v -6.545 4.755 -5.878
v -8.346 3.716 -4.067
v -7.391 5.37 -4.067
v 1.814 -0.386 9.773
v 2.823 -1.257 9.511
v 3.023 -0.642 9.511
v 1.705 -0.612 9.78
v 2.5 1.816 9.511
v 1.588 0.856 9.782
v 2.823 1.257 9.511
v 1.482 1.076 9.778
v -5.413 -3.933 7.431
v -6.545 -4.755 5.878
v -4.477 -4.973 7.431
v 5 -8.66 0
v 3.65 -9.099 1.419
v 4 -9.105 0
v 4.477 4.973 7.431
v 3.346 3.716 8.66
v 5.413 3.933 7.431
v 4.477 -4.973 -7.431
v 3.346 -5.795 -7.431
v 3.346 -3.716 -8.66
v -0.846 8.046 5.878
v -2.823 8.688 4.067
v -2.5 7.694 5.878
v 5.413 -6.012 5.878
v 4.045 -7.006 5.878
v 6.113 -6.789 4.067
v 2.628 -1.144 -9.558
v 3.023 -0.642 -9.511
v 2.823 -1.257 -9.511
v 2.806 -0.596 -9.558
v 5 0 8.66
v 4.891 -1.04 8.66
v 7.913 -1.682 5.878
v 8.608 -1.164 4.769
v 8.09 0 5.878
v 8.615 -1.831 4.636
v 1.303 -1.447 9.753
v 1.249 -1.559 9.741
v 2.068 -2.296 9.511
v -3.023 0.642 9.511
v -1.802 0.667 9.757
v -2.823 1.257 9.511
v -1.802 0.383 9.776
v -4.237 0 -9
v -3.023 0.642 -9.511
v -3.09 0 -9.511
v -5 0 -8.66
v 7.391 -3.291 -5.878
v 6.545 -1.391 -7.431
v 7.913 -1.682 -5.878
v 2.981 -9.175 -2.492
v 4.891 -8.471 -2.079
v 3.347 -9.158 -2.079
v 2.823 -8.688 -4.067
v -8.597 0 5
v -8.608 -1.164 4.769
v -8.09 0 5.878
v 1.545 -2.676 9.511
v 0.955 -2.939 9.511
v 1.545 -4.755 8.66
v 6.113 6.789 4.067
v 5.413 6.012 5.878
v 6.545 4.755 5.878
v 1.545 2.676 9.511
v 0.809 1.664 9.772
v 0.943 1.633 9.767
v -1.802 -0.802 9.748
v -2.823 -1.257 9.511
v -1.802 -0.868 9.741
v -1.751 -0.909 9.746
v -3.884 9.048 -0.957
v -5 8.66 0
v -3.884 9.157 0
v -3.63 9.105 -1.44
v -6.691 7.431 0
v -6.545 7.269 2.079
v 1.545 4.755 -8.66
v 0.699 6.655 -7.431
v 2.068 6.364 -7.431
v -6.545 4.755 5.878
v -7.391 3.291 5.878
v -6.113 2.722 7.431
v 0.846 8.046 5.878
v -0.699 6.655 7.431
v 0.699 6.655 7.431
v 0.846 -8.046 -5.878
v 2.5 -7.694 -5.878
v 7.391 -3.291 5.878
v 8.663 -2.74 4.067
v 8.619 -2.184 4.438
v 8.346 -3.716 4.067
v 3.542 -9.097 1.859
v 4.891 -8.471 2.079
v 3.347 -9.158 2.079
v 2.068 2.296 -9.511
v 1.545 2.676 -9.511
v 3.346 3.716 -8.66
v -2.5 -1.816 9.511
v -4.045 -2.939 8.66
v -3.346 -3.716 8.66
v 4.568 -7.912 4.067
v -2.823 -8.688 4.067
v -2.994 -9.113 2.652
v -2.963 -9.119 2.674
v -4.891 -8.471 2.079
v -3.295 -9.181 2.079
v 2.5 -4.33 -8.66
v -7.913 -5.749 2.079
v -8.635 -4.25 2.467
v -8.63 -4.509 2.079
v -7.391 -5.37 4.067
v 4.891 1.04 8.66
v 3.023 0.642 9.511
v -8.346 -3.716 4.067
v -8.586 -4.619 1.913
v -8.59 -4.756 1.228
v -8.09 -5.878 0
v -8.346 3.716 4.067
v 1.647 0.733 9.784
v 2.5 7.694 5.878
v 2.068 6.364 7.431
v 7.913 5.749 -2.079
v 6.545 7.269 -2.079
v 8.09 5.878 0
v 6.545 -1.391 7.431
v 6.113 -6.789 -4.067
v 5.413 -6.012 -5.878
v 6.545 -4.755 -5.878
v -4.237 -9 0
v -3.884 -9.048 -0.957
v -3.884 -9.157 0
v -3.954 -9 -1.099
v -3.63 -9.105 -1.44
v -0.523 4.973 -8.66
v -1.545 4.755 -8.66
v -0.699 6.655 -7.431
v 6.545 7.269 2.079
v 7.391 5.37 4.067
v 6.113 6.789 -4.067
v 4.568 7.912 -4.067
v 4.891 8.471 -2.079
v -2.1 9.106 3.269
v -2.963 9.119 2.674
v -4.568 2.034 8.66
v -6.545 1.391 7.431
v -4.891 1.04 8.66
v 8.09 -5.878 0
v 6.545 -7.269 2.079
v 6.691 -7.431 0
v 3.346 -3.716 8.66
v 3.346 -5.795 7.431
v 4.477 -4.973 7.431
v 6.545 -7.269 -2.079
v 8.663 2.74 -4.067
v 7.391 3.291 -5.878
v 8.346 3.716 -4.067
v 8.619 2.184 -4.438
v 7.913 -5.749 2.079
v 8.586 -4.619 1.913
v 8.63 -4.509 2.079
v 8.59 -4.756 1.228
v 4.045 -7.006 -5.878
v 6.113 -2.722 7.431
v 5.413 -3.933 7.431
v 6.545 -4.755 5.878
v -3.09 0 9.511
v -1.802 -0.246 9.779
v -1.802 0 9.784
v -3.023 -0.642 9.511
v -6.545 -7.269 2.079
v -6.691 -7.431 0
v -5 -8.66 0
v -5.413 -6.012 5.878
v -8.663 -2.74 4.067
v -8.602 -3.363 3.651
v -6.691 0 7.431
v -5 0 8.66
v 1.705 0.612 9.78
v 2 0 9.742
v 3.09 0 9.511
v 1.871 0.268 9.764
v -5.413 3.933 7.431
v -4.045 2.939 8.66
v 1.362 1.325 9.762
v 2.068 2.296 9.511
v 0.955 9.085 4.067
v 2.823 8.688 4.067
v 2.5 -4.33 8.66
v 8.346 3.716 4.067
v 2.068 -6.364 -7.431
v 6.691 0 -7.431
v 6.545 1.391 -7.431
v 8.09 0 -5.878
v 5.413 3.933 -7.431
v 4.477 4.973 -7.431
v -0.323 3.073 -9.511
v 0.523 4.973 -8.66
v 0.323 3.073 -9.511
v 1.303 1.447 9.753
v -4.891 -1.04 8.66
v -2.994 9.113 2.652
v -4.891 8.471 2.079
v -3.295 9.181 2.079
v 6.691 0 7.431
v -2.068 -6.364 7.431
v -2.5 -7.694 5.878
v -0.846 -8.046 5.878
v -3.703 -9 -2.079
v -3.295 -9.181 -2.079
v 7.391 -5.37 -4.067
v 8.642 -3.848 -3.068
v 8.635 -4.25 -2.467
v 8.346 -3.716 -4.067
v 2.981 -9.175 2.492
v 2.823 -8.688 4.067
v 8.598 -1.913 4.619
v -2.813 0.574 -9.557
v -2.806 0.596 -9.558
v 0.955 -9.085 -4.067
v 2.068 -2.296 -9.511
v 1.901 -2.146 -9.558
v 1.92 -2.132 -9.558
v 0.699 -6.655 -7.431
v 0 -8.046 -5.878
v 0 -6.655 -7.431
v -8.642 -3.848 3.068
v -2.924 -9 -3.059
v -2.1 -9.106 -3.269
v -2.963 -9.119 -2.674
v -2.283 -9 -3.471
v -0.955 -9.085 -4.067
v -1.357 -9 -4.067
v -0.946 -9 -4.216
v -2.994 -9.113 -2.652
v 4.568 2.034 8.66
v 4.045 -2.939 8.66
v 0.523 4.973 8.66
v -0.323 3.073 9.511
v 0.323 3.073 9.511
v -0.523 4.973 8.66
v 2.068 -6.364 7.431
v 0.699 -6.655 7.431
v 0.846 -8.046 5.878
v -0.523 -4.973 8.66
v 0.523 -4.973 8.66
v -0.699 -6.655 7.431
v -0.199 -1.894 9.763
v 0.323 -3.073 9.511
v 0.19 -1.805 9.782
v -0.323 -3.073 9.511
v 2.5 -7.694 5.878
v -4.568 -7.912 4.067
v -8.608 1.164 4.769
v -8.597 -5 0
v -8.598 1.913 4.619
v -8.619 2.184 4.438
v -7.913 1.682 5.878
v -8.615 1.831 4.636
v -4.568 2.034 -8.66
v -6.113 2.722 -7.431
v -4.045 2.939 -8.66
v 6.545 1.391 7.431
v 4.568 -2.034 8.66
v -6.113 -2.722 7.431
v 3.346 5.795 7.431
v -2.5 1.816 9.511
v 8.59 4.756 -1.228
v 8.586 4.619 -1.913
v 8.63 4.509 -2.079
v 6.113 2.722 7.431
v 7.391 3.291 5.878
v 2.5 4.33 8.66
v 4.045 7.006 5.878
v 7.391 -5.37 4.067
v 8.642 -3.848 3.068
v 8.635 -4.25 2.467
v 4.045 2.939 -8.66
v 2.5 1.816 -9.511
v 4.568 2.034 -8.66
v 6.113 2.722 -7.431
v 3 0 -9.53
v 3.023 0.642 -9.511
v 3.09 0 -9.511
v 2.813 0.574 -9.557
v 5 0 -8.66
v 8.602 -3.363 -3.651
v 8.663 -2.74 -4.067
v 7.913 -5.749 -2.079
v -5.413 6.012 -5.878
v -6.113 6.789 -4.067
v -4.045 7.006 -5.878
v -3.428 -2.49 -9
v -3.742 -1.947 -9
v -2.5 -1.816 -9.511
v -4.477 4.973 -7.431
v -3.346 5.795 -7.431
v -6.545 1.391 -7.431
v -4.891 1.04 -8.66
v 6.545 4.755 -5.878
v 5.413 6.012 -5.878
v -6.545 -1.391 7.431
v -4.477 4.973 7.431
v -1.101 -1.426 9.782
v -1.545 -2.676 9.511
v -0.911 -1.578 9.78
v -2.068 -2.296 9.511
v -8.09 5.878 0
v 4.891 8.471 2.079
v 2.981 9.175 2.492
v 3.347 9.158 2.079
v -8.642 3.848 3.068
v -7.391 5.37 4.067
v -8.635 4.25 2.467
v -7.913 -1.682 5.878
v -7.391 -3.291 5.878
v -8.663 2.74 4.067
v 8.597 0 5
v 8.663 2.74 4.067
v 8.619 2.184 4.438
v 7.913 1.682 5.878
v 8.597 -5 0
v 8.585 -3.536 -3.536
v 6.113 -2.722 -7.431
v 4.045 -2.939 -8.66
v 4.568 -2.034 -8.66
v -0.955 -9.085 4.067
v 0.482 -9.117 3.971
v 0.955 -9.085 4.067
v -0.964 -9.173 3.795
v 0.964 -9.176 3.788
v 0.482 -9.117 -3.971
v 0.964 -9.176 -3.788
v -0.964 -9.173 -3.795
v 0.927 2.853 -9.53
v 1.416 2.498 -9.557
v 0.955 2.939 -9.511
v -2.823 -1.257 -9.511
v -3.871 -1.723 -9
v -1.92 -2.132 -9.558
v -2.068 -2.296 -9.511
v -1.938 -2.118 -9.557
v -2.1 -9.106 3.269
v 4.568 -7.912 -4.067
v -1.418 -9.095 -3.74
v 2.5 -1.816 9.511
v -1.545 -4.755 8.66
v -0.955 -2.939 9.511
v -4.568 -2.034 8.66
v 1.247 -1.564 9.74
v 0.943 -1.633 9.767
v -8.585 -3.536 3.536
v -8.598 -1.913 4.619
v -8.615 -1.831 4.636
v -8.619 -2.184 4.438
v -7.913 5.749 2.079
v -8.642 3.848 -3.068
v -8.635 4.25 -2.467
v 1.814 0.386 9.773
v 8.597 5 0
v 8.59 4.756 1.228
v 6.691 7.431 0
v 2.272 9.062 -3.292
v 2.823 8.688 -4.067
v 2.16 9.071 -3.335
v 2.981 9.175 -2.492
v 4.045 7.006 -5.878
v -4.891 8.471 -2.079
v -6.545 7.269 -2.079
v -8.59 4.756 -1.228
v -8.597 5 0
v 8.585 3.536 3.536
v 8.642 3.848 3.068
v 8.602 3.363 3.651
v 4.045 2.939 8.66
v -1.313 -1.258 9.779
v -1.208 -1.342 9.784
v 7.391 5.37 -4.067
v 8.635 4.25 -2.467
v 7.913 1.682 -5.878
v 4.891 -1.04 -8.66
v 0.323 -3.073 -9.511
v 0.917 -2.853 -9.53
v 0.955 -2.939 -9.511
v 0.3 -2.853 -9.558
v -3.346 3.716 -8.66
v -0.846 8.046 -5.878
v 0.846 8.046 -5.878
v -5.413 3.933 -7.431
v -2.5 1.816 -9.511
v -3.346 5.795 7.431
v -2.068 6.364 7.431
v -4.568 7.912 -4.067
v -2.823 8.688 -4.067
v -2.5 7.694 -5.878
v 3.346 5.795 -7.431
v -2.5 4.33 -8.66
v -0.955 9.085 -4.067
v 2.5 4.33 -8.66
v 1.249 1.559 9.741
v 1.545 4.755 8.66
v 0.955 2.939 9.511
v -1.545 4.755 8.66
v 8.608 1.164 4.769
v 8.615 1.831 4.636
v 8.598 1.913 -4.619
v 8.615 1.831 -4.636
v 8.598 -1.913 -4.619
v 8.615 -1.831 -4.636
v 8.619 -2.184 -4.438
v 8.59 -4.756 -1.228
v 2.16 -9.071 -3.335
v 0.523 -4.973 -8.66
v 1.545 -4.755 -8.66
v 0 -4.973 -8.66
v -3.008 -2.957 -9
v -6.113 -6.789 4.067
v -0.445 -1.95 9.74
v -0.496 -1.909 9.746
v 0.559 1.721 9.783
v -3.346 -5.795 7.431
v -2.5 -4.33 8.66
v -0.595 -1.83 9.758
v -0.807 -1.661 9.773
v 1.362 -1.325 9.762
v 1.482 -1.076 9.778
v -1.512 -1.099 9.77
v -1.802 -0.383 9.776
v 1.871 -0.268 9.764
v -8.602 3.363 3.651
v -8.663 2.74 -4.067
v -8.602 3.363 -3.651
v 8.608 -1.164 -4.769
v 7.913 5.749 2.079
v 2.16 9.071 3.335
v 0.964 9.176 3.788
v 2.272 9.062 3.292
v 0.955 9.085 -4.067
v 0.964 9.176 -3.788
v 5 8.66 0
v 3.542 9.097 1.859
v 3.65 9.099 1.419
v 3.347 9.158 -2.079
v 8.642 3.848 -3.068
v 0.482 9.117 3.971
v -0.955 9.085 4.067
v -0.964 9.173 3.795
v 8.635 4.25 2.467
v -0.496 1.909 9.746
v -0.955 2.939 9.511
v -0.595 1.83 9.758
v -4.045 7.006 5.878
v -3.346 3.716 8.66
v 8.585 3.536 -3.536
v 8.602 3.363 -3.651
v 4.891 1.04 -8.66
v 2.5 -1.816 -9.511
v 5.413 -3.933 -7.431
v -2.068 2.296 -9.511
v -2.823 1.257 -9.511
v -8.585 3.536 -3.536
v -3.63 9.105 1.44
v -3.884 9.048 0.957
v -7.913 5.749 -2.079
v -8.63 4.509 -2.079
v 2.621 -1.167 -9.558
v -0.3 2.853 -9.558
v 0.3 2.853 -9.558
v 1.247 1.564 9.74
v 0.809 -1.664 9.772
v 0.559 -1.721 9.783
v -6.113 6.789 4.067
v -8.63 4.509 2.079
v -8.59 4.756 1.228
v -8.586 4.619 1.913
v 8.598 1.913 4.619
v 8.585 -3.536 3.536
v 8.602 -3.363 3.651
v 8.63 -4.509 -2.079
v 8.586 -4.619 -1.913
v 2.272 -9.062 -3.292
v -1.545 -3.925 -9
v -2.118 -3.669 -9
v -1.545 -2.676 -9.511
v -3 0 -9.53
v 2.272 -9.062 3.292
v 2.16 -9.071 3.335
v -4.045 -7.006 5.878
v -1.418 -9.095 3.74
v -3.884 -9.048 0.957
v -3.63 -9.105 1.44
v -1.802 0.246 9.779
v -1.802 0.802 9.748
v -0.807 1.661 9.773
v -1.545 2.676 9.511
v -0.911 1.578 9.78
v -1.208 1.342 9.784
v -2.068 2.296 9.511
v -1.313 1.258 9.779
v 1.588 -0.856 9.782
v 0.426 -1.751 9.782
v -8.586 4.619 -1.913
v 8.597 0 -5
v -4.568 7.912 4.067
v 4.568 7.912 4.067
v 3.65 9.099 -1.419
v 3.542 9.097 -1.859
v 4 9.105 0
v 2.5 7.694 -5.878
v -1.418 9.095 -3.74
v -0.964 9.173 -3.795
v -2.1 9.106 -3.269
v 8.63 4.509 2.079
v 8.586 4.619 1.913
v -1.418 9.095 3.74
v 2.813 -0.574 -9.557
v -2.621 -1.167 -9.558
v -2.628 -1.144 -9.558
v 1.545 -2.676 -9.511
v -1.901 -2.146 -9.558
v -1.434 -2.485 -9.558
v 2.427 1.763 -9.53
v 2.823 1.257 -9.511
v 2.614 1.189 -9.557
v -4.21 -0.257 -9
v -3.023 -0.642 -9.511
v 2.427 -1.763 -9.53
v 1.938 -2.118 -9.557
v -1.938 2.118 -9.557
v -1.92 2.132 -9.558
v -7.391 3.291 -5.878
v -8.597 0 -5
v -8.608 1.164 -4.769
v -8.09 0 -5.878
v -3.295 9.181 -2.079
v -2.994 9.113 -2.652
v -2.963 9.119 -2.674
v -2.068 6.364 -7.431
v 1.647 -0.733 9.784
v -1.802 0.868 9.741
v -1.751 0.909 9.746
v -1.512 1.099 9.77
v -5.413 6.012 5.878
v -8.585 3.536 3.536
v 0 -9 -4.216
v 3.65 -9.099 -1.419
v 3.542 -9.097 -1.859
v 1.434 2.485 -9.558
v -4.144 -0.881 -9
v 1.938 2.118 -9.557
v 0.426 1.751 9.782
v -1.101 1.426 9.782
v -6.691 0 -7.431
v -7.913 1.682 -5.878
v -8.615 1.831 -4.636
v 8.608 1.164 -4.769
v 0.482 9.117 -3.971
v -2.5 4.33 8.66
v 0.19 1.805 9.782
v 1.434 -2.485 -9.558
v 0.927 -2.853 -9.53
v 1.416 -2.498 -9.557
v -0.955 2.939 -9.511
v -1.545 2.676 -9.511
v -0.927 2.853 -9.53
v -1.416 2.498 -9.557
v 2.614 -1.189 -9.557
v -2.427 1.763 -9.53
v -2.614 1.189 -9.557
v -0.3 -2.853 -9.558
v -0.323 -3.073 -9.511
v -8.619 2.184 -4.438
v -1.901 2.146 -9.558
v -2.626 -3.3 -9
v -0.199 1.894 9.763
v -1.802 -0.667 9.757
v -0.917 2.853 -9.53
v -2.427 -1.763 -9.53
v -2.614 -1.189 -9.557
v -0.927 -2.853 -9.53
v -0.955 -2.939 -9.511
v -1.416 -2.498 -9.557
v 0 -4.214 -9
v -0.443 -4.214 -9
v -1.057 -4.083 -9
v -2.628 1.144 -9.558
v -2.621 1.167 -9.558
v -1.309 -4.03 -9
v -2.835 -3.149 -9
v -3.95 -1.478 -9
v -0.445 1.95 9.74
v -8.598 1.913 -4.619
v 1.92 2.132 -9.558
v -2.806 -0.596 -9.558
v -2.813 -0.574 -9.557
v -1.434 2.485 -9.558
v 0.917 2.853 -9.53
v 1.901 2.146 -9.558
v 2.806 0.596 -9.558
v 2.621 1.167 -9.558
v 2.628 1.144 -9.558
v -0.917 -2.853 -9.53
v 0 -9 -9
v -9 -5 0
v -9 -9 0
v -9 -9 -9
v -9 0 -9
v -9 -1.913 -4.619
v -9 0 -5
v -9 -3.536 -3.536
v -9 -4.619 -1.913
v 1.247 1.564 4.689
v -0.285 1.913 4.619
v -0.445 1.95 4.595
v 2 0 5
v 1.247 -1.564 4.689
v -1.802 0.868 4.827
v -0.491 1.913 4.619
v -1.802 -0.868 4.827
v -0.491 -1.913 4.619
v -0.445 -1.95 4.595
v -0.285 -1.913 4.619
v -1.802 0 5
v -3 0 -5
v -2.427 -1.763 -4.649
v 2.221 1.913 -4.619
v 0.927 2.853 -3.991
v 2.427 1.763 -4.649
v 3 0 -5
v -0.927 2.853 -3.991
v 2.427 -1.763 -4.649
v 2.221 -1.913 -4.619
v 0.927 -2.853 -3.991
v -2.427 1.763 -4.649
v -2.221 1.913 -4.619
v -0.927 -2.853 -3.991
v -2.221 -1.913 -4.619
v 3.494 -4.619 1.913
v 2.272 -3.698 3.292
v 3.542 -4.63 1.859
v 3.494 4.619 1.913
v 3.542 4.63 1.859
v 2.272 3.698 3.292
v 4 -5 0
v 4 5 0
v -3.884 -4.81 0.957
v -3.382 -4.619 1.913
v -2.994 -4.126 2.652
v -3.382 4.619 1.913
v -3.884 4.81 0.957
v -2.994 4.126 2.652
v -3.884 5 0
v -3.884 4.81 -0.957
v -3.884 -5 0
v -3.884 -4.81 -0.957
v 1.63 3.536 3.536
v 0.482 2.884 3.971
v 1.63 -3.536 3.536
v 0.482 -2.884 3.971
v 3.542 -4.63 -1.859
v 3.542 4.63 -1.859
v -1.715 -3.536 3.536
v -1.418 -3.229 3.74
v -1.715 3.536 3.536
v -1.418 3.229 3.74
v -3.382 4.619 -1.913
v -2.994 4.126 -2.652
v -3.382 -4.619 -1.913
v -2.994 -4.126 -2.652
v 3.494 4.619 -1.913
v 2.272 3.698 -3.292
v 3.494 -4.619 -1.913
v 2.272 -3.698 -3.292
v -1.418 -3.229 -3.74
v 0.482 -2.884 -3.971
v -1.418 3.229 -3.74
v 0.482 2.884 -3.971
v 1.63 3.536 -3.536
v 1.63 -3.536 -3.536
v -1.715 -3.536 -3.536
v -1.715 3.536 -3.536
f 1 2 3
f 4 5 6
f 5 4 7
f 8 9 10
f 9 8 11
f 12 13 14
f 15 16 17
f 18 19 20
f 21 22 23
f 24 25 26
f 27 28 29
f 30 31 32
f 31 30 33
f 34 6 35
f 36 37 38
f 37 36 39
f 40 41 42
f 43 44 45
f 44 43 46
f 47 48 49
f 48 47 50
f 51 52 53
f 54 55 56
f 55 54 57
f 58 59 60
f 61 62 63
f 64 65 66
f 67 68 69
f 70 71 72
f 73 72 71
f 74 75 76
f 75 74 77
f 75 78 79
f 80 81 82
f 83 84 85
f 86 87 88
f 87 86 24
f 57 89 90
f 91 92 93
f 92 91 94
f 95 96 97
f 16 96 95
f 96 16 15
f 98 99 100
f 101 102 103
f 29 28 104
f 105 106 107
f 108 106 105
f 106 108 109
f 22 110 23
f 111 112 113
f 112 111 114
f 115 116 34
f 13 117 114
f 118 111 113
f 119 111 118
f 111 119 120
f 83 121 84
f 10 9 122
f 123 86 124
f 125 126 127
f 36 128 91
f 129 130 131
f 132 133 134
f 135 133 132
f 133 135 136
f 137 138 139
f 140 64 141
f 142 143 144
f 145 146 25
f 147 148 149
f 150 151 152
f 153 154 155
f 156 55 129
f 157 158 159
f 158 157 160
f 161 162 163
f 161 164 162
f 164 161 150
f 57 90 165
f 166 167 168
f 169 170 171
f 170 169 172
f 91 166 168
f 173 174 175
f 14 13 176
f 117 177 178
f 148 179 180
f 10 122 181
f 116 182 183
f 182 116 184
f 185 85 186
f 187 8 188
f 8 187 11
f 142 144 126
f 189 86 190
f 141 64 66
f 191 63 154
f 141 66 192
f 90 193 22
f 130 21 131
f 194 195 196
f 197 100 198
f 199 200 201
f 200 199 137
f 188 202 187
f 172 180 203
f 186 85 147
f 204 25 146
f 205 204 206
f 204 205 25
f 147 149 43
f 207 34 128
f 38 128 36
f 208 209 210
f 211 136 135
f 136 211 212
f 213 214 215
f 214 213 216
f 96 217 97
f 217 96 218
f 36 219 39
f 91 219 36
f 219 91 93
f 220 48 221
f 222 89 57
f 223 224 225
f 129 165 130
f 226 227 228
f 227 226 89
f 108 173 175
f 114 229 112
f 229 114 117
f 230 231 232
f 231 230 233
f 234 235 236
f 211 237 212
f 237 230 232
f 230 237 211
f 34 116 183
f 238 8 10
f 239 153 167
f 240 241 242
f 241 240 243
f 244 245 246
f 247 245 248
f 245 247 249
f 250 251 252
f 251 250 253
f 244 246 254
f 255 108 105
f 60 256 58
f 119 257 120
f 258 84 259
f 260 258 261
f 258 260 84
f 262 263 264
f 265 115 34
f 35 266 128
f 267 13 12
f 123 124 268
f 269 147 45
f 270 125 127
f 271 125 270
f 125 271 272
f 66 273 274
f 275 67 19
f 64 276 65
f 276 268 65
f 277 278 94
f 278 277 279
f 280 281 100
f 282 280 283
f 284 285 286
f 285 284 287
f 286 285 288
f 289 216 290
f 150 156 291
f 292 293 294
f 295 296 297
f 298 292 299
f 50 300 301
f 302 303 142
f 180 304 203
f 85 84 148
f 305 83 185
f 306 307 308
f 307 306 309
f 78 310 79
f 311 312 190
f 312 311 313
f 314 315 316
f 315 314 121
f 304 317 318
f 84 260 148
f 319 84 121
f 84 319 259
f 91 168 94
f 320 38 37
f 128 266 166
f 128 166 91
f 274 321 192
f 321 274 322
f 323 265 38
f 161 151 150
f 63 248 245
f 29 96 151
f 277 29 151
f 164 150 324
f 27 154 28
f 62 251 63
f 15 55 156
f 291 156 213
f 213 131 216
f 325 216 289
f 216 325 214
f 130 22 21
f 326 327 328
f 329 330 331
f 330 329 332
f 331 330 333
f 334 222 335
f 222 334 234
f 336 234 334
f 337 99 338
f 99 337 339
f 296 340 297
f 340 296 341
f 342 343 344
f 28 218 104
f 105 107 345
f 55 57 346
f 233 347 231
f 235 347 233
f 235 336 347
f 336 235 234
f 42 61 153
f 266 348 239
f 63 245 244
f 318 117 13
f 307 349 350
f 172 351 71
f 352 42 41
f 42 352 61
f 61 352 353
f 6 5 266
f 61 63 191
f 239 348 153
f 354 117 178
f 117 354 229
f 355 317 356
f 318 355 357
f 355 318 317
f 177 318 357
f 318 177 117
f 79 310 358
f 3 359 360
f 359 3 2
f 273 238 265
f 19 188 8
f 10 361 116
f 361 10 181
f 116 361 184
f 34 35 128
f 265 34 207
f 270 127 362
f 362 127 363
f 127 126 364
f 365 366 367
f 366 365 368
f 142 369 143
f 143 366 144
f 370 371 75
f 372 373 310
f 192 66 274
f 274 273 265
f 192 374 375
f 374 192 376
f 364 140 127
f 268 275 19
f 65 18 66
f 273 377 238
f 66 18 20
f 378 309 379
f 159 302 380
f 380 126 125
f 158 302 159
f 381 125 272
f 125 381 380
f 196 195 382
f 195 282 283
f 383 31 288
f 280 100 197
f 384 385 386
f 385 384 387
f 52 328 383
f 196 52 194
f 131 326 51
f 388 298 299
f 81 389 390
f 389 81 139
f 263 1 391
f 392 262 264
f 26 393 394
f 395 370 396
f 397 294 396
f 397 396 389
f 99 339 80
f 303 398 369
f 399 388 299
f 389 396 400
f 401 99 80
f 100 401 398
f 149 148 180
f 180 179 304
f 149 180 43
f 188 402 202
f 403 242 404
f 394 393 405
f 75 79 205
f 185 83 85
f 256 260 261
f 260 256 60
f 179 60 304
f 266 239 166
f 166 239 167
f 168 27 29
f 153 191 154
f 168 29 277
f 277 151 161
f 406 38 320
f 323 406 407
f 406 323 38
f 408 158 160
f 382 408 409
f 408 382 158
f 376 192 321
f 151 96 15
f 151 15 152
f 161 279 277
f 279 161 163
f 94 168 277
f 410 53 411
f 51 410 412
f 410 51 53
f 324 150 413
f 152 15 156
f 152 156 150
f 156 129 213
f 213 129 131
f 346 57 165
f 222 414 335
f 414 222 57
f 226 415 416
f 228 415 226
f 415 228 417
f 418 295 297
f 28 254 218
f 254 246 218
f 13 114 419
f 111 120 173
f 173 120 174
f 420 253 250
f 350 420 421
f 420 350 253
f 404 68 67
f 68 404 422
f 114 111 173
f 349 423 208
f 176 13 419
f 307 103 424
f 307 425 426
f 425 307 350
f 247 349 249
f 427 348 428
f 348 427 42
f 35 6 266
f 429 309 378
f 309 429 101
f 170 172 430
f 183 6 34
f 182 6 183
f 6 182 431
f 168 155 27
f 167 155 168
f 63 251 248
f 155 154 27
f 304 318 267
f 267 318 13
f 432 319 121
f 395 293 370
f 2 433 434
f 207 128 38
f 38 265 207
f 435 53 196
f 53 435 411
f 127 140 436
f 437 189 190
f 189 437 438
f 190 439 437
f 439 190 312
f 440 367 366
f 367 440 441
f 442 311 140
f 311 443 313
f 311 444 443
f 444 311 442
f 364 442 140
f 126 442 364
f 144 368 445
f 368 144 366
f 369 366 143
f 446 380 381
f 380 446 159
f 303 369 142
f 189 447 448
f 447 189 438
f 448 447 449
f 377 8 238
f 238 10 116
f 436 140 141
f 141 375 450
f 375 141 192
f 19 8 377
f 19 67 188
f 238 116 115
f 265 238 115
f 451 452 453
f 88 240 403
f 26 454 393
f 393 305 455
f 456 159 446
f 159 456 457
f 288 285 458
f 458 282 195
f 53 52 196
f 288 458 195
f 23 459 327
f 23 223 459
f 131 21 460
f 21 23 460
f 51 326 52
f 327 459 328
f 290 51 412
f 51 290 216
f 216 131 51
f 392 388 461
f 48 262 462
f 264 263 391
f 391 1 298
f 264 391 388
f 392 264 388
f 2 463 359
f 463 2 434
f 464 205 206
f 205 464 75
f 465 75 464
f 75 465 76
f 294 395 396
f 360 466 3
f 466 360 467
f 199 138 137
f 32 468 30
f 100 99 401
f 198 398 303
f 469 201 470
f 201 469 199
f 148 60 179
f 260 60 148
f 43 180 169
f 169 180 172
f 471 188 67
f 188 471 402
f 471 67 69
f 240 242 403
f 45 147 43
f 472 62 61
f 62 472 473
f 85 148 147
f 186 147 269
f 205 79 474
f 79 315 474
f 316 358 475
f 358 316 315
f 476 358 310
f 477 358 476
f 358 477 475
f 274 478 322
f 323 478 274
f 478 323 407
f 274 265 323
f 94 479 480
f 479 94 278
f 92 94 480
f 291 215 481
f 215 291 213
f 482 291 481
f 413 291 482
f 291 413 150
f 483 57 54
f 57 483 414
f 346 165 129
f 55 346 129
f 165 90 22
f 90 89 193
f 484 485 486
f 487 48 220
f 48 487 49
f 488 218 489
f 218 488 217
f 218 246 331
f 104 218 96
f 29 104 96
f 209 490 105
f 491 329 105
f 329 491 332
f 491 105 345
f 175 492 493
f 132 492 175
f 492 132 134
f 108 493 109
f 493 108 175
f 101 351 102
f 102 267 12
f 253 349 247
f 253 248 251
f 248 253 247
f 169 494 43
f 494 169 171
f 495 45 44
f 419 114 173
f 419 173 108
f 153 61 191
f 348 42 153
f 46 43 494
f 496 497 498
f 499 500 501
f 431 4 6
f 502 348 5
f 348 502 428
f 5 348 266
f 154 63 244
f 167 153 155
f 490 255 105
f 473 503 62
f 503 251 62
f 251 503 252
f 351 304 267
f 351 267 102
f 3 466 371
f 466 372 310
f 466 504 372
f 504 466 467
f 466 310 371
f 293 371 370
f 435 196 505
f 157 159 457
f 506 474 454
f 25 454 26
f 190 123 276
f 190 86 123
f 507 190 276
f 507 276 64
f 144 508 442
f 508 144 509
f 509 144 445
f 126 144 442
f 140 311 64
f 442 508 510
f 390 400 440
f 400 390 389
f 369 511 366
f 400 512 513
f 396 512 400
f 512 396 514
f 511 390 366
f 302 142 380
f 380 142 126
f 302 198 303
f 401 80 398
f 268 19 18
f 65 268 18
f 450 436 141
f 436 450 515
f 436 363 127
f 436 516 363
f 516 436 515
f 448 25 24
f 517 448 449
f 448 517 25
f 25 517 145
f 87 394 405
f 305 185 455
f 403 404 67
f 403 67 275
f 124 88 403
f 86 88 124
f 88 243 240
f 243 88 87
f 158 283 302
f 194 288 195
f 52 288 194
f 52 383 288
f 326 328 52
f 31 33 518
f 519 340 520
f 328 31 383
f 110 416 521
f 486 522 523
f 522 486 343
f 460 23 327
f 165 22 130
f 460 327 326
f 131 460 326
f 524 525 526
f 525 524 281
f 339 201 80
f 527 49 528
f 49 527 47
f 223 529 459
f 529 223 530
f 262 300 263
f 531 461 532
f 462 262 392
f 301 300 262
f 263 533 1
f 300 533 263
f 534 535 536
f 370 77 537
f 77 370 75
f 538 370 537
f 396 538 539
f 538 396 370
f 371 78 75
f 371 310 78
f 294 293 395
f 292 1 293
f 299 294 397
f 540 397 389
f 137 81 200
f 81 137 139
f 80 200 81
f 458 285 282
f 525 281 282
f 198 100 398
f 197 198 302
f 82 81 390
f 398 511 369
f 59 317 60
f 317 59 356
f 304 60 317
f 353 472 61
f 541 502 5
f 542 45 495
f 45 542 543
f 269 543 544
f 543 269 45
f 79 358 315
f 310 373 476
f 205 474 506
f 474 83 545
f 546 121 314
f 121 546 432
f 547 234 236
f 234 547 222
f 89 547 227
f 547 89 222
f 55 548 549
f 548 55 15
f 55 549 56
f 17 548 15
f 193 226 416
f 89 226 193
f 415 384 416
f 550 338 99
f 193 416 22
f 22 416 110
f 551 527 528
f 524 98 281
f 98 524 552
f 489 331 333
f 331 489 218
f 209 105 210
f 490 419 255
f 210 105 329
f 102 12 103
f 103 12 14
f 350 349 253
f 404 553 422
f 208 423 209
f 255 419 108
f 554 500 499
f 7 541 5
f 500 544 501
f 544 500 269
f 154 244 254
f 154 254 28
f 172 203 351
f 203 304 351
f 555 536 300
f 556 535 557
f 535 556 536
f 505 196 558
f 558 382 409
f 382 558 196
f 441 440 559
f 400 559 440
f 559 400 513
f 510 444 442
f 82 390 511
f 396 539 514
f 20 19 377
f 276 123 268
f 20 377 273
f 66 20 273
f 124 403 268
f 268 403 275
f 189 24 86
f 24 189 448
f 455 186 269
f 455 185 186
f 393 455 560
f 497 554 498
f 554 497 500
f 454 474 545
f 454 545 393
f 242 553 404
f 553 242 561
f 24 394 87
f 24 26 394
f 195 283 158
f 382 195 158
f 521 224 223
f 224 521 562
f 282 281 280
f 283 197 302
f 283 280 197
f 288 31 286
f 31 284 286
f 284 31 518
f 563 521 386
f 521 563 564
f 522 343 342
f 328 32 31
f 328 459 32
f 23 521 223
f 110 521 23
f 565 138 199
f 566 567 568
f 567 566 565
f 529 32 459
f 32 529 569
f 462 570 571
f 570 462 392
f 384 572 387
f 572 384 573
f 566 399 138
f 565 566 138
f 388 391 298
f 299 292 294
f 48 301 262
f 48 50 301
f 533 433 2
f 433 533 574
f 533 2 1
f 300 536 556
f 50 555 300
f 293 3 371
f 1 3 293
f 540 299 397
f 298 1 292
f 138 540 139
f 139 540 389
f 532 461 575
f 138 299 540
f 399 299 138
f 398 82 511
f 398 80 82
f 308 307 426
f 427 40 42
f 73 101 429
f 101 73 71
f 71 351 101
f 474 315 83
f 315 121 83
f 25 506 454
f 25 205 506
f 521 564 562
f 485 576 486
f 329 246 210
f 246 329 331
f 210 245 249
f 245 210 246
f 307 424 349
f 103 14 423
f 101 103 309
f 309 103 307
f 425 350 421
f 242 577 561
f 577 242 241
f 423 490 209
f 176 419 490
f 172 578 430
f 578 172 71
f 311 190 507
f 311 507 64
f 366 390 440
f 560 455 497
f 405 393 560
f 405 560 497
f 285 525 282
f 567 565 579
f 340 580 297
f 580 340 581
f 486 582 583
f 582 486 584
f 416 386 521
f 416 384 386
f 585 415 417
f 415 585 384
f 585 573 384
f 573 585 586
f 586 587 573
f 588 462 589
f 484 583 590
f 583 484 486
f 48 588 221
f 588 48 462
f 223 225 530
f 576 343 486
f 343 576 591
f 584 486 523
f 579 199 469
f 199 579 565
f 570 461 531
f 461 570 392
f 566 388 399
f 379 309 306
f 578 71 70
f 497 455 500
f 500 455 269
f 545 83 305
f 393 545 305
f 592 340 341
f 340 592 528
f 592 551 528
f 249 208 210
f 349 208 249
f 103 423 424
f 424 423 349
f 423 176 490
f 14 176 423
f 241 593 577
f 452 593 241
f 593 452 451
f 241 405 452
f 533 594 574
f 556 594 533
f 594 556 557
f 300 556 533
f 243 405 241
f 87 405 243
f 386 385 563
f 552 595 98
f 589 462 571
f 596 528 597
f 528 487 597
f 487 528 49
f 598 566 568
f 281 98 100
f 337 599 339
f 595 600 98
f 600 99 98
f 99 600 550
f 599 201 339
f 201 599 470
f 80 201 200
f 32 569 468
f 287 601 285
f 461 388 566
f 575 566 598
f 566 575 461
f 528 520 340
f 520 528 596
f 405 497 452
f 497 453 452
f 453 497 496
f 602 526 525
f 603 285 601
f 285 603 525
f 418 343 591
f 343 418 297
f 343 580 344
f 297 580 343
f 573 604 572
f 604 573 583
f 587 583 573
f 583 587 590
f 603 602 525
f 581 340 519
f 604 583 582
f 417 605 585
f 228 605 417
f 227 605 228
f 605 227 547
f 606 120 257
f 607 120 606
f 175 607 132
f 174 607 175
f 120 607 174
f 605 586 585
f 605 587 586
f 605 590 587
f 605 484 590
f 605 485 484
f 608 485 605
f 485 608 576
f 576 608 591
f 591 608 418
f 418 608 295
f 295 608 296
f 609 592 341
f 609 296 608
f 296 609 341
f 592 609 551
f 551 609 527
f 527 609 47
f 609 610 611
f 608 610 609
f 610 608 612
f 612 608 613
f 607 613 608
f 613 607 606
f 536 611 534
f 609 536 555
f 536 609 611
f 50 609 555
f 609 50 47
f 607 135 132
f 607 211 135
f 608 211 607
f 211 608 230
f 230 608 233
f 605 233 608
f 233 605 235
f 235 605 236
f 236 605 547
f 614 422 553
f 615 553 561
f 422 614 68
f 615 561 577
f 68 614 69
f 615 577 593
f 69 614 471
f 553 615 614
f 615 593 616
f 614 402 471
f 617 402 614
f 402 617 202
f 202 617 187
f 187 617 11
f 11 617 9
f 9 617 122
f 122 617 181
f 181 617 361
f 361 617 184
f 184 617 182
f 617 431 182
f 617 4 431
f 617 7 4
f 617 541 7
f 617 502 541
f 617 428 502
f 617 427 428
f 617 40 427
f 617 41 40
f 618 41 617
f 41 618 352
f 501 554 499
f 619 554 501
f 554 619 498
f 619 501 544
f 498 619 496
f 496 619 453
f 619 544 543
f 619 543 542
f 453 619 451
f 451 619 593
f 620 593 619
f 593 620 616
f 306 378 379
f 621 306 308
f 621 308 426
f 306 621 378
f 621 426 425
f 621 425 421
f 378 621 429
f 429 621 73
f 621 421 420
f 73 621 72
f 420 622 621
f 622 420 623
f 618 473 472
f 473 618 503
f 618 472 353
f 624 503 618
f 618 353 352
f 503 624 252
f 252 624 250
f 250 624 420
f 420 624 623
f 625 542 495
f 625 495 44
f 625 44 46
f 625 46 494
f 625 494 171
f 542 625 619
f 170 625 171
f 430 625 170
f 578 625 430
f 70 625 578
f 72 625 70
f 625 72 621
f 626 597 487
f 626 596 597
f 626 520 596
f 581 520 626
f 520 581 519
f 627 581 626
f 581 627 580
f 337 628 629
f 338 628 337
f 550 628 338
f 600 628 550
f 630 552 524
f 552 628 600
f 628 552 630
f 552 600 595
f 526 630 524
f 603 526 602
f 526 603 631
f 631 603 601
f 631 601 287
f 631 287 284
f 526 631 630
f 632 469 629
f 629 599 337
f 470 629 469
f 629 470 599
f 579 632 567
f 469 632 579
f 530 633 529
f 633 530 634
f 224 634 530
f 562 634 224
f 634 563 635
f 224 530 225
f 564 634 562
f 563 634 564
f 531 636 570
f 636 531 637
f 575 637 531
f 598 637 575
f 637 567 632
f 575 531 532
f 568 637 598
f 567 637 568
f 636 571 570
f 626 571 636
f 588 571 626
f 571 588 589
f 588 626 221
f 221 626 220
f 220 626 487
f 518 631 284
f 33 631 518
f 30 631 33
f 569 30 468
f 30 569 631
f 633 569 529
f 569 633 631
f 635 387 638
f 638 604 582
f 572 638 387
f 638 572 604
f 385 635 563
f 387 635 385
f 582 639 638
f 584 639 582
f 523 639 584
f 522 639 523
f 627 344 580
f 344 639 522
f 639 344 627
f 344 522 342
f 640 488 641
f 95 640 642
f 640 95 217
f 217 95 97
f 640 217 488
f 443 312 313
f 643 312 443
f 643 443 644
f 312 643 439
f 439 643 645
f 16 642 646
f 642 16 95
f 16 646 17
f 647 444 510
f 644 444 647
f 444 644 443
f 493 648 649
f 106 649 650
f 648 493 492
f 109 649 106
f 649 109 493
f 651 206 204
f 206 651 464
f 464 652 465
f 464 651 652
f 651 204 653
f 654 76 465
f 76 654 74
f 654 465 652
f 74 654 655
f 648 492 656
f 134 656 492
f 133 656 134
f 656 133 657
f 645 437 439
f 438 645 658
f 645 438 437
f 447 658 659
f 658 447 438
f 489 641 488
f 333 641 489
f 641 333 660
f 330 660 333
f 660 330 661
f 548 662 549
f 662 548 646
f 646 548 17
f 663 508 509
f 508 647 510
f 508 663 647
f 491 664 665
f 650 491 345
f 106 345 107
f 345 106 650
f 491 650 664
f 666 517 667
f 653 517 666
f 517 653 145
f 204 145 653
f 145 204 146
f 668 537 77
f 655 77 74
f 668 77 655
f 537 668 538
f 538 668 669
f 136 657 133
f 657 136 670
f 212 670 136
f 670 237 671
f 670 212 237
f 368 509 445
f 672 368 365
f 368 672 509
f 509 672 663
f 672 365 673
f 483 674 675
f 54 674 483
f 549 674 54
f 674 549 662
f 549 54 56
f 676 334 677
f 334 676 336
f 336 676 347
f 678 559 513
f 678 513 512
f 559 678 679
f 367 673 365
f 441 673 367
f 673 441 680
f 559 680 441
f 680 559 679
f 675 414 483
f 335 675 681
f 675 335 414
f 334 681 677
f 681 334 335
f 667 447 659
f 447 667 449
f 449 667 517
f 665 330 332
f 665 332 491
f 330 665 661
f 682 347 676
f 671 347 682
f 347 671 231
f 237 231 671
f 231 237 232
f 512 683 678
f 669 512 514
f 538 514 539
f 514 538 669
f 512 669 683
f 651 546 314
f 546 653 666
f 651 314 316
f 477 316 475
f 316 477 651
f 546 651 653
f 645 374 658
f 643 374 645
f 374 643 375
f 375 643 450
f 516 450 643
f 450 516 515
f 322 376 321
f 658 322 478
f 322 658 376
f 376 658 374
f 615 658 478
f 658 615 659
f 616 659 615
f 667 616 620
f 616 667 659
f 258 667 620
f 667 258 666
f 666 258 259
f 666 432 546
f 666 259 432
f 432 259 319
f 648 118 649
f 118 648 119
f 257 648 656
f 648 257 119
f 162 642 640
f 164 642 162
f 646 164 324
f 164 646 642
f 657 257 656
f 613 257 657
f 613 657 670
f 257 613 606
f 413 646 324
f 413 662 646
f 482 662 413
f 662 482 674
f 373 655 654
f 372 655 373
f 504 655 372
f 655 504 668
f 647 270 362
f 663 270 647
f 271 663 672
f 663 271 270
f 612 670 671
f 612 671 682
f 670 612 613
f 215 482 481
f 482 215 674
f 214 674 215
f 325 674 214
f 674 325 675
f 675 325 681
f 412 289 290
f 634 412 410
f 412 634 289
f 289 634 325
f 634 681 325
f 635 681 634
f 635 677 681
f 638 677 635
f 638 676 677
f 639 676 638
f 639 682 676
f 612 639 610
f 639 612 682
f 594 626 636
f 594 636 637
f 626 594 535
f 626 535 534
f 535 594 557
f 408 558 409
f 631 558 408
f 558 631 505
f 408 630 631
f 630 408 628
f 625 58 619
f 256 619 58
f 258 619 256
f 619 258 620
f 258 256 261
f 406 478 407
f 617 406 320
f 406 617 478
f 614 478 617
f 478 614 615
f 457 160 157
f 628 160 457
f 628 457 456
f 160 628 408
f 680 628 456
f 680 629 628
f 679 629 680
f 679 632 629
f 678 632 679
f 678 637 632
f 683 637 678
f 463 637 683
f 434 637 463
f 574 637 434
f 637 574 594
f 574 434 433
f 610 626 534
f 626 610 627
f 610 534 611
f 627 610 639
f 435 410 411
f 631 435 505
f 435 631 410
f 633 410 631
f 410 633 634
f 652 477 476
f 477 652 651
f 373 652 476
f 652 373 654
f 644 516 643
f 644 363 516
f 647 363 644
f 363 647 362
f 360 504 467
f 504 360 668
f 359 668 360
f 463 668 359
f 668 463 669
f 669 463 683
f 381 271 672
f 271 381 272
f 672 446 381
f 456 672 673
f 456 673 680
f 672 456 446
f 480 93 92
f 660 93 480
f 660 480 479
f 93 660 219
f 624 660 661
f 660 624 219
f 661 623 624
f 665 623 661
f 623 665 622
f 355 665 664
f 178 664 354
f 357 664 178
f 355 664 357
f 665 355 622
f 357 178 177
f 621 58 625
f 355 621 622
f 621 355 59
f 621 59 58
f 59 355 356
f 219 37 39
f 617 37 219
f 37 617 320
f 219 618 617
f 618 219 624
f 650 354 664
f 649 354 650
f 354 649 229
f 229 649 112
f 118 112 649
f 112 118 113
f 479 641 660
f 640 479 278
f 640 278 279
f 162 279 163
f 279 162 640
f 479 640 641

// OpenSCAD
// $fn = 32;

difference()
{
    union() {
        sphere(r=10);
        
        translate([ -9, -9, -9 ])
        cube(9);
    }
    
    translate([ 0, 0, +15 ])
    cylinder(r=2, h=30, center=true);

    translate([ 0, 0, -15 ])
    cylinder(r=3, h=30, center=true);

    rotate([ 90, 0, 0 ])
    cylinder(r=4, h=30, center=true);

    rotate([ 0, 90, 0 ])
    cylinder(r=5, h=30, center=true);
}
